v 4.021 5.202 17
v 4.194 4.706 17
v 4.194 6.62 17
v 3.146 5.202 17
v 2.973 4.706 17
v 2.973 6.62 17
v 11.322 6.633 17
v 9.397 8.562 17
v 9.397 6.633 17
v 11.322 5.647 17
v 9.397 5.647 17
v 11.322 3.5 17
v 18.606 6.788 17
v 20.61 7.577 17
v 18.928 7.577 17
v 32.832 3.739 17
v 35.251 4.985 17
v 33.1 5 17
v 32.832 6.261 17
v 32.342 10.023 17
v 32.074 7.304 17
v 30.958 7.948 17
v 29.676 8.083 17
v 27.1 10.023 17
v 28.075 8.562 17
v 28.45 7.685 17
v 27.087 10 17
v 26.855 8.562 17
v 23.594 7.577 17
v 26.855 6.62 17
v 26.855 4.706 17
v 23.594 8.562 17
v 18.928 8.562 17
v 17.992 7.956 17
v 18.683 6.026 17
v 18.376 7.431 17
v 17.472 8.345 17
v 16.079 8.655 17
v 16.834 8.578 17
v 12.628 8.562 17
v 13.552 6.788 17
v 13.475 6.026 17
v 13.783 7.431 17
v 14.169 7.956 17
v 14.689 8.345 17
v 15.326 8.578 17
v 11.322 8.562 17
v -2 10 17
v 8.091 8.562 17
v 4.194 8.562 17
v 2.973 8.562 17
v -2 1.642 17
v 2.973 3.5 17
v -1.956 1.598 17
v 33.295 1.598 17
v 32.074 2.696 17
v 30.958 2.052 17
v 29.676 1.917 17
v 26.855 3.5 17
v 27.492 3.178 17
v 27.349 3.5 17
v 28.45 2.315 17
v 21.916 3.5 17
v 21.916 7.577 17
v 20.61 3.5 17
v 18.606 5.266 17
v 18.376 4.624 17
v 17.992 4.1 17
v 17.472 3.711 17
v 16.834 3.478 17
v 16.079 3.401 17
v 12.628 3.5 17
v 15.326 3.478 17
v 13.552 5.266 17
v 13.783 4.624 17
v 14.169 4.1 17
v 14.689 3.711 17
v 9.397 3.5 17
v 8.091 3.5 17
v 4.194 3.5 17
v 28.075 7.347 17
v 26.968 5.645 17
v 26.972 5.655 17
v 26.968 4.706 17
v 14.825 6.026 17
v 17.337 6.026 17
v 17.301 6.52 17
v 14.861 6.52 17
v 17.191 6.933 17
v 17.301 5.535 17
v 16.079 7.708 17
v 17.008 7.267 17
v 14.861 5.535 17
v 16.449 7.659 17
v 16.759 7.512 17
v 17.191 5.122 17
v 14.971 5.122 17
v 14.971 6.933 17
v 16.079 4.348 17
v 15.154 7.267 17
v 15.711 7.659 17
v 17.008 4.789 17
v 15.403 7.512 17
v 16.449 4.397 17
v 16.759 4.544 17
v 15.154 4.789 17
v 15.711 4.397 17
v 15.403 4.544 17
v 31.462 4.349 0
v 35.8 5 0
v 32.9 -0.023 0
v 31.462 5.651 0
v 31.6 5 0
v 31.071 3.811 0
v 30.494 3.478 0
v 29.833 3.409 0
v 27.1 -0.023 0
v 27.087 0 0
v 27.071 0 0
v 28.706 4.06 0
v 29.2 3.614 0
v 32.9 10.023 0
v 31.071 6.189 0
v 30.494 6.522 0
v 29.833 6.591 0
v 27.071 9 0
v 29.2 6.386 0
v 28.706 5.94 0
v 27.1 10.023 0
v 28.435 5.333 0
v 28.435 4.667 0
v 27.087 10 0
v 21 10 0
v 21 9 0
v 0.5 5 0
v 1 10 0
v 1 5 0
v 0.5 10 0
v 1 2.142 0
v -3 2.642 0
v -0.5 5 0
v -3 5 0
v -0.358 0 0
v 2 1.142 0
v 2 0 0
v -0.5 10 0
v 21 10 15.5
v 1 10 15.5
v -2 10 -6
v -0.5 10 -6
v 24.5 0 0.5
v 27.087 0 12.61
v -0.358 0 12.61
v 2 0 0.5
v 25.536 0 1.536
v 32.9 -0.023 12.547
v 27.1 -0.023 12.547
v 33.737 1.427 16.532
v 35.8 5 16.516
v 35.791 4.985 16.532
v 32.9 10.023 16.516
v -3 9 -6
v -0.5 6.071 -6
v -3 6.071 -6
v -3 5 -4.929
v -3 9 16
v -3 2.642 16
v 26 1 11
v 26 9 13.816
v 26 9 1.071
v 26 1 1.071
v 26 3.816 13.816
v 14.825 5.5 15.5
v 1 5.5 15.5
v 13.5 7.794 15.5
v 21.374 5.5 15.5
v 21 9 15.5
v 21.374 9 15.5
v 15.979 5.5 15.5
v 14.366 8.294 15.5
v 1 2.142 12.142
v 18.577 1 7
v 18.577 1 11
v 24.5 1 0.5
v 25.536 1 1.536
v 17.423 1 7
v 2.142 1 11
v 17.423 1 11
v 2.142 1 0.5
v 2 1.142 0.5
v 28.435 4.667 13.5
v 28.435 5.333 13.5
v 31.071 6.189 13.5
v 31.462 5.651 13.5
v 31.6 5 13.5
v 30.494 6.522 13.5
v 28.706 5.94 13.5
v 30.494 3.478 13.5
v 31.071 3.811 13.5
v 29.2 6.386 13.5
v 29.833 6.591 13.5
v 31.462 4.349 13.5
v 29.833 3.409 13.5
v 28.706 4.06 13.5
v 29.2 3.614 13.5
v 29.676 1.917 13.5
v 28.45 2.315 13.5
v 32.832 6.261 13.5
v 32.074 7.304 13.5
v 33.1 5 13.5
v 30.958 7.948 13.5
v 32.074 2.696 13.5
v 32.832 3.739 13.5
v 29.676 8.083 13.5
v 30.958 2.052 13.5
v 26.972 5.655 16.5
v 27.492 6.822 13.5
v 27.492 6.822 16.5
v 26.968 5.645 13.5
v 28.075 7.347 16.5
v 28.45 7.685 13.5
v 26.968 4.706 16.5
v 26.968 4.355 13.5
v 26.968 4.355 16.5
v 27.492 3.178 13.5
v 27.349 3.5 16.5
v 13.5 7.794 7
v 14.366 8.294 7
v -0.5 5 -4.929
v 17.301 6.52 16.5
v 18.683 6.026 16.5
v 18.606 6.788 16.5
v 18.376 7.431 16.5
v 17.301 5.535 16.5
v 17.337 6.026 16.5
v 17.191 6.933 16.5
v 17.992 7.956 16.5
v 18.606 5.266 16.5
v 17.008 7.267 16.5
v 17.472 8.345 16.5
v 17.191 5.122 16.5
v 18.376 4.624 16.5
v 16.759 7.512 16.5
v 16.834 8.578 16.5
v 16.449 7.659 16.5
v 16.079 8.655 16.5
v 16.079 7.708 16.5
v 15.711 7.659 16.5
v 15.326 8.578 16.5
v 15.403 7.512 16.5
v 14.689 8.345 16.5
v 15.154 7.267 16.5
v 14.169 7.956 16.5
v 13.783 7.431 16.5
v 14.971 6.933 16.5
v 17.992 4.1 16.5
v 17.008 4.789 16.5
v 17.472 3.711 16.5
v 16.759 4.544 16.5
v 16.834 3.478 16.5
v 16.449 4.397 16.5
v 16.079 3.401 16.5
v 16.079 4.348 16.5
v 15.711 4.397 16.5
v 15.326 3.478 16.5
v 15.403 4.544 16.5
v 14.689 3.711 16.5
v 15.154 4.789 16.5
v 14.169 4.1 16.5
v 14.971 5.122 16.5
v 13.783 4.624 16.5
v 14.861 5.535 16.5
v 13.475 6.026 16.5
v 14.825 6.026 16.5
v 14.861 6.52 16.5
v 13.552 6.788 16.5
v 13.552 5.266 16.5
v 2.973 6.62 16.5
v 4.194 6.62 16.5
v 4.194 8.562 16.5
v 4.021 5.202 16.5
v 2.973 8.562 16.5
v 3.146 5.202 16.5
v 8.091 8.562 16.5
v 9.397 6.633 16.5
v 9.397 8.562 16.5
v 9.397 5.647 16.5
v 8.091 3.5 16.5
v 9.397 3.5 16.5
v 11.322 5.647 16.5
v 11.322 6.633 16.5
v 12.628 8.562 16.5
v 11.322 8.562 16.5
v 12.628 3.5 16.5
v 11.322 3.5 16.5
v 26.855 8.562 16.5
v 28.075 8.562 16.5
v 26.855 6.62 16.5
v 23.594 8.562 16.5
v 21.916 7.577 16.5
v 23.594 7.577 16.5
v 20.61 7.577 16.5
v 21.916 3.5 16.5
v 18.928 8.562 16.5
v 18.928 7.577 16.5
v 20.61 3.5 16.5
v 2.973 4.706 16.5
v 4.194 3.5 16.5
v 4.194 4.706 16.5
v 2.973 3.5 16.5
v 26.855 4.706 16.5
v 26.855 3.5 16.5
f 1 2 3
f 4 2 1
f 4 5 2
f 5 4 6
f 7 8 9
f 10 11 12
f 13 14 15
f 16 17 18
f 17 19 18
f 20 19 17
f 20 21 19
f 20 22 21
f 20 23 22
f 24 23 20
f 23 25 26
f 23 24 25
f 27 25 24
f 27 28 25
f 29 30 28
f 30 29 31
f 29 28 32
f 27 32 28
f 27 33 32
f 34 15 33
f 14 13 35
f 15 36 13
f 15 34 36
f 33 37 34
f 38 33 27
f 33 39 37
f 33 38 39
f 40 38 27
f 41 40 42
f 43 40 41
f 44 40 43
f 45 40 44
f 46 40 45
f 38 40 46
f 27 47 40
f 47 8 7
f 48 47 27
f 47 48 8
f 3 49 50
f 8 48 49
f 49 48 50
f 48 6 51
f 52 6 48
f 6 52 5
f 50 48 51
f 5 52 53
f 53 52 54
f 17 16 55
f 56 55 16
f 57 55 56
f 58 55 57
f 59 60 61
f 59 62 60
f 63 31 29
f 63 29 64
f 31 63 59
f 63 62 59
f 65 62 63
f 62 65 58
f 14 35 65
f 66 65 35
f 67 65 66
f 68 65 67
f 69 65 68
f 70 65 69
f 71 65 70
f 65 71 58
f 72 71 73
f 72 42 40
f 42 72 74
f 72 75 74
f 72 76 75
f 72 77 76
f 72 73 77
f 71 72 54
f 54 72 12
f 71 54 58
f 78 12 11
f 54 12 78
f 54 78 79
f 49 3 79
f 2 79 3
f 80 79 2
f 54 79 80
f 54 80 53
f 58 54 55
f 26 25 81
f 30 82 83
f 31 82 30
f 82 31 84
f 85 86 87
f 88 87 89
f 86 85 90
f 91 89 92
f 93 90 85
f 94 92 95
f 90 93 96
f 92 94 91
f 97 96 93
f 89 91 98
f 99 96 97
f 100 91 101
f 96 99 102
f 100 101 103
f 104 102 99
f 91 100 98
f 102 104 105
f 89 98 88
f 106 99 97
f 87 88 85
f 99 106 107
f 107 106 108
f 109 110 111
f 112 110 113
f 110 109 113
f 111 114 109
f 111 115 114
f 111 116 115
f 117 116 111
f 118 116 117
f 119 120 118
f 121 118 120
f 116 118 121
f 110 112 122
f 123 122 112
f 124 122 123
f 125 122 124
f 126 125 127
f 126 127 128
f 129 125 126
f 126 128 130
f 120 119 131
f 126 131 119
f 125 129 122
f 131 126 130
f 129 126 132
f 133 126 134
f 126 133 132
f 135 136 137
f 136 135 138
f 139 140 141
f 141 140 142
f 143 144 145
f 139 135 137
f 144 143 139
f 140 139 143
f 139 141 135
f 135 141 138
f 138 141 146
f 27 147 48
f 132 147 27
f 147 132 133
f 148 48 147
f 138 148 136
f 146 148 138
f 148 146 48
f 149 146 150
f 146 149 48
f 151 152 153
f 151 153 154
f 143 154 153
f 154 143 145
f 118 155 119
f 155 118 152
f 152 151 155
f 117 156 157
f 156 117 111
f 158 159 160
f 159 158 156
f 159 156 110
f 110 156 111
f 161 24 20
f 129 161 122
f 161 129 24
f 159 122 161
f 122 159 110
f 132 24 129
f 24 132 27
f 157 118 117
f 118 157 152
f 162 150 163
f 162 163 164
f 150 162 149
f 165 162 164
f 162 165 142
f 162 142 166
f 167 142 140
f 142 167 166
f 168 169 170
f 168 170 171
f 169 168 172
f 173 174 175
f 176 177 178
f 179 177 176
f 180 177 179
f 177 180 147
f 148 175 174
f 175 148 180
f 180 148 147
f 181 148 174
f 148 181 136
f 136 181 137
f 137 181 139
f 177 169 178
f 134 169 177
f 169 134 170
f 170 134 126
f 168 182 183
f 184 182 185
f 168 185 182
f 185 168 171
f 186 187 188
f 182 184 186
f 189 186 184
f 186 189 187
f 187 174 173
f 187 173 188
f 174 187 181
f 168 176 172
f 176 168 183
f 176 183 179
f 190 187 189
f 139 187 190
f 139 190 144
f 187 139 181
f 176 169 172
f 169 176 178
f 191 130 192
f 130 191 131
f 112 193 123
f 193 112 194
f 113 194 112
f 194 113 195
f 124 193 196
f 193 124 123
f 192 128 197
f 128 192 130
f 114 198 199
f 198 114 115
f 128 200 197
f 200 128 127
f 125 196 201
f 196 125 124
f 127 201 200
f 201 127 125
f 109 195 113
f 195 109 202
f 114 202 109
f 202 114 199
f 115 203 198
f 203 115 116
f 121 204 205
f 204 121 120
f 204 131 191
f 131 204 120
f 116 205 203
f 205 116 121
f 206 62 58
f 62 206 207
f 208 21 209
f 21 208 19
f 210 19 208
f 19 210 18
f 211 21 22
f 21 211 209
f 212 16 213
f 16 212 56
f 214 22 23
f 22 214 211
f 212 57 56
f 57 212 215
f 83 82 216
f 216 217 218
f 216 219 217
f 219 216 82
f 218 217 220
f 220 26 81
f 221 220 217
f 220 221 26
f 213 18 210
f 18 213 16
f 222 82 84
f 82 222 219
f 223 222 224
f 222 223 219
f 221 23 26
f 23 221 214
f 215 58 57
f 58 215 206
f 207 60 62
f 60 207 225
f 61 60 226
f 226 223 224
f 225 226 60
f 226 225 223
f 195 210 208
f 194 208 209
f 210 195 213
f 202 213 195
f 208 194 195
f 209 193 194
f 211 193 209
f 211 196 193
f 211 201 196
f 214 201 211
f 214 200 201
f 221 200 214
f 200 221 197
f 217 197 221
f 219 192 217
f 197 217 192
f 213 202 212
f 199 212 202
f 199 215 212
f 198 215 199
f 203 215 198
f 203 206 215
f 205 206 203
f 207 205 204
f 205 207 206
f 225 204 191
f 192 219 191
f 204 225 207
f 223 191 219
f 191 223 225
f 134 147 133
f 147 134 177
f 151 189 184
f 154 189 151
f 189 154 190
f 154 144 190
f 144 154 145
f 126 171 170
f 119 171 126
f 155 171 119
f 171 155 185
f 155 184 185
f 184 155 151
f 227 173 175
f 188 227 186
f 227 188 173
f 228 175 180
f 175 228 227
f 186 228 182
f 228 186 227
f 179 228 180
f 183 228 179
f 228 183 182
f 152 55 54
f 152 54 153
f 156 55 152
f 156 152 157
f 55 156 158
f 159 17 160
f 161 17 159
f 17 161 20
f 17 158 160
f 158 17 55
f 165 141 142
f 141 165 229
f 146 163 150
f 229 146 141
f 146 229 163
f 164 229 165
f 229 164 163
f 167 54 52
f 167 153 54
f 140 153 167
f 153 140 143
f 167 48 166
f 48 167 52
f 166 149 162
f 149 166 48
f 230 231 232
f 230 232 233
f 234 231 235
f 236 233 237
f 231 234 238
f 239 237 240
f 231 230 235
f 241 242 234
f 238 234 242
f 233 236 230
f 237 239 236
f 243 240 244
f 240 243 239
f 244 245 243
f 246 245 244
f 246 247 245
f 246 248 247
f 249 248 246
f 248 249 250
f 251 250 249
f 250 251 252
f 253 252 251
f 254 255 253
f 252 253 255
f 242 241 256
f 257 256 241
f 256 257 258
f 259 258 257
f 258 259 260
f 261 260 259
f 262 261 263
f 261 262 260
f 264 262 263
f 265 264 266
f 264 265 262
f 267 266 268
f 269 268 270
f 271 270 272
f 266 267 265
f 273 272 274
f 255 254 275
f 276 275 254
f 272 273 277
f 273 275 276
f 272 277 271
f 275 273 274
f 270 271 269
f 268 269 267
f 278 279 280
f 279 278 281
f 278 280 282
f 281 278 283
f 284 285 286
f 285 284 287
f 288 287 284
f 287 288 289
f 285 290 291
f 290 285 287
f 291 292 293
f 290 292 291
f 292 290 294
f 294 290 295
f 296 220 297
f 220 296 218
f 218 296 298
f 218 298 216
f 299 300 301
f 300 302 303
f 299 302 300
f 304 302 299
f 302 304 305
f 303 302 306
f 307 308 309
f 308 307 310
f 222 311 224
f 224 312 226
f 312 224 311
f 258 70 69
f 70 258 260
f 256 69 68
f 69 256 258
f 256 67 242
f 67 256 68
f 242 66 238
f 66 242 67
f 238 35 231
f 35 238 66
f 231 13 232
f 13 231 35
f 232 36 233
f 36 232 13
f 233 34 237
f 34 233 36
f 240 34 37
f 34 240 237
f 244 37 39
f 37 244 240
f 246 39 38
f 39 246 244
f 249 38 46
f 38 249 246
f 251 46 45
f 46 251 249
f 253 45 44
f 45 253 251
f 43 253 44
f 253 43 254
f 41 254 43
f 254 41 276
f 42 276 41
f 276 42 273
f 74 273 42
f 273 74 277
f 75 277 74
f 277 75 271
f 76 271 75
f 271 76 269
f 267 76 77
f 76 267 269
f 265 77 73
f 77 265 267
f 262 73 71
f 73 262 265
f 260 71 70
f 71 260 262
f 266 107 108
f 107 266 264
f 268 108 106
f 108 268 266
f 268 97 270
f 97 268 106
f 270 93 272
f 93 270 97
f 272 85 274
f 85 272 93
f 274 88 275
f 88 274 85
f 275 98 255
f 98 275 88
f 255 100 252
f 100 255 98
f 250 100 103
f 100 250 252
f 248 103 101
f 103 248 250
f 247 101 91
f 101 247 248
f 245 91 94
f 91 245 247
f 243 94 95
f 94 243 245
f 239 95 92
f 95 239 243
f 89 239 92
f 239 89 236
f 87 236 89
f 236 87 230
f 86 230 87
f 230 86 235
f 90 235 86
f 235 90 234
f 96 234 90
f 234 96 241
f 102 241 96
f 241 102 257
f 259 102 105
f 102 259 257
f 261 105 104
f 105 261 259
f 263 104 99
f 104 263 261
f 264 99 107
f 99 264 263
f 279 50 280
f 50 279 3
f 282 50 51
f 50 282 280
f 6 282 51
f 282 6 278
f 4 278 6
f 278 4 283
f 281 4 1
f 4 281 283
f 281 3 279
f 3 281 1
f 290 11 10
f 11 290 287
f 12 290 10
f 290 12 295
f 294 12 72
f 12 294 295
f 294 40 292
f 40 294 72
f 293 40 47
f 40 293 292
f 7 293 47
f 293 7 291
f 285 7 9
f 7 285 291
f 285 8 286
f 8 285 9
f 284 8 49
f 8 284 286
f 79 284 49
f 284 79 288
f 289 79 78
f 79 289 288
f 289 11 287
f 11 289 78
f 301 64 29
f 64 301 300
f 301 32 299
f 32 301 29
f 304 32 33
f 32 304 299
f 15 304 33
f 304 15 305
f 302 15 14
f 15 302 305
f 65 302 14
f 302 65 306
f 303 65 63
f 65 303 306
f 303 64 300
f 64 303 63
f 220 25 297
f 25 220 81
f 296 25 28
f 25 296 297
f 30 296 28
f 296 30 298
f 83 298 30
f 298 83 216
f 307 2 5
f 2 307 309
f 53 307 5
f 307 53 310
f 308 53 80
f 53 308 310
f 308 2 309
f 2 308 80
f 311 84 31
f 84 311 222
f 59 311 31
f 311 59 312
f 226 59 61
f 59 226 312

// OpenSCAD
// E3D Volcano fan nozzle for Prusa i3 MK2 and LibreMatter UMO+ E3D mount
// from LibreMatter
// burdickjp@protonmail.com

module fan_nozzle(){
    
    difference(){    
        union(){
            cube([32,10,17]); // Main cube
            translate([30,5,0])cylinder(r=5.8,h = 17, $fn=6);    
            translate([-3,0,-6]) cube([3,10,23]);
            
        }
        // Mounting screw
        translate([30,5,-10])cylinder(r=3.2/2,h = 24.5-0.2, $fn=15); // Screw cut
        translate([30,5,17-3.5])cylinder(r=3.1,h = 20, $fn=15); // head cut

        // Fan entry hole
        translate([1,10-1.5,-1])cube([20,3,16.5]);
        translate([1,10-1.5,-1-5])cube([18,3,16.5]);
    
        // Airway cutout
        difference(){    
            translate([1,1,-1])cube([25,8,16.5]);    
            translate([0,0,10])rotate([45,0,0])cube([30,8,16.5]);    
            translate([-1,-10,-1])rotate([0,0,45])cube([10,8,30]); 
            translate([20,0,16])rotate([0,20,0])cube([10,20,10]);    
        }
        translate([2,-1,-4.5])cube([24,3,5]);
        translate([22,-1,-2])rotate([0,45,0])cube([5,10,5]);
    
    }

    // Air director
    translate([18,0,7])rotate([0,0,30])cube([1,9,10]);


}

module fancy_corners(){
    
    translate([-10,-10.5,13])rotate([-20,0,0])cube([50,10,15]);
    translate([-16,-10.5,17.5])rotate([0,45,0])cube([10,30,15]);
    
    translate([46.5,-10.5,15])rotate([0,-45,30])cube([10,30,15]);
    translate([28.62,-10.5,15])rotate([0,-45,-30])cube([10,30,15]);

    translate([-5,-1,-7])rotate([0,0,0]) cube([10,6,7]);
    translate([-0.5,-1,-7])rotate([0,0,0]) cube([1,15,7]);
    translate([-5,4,-11])rotate([45,0,0]) cube([10,5,5]);

    //left cut
    translate([-6.5,-8,-5])rotate([0,0,45])cube([10,10,45]);
    translate([-7,-5,12])rotate([0,-45,0])cube([10,30,15]);
    
    translate([-7,5,-10])rotate([0,0,45])cube([10,10,35]);
    
    }

module fan_n(){
    difference(){
        fan_nozzle();
        fancy_corners();    
        translate([2,3.5,16.5])linear_extrude(height = 0.6) {text("! HOT !", size = 5, font = "Helvetica Neue:style=Bold");}
    }
}

fan_n();
